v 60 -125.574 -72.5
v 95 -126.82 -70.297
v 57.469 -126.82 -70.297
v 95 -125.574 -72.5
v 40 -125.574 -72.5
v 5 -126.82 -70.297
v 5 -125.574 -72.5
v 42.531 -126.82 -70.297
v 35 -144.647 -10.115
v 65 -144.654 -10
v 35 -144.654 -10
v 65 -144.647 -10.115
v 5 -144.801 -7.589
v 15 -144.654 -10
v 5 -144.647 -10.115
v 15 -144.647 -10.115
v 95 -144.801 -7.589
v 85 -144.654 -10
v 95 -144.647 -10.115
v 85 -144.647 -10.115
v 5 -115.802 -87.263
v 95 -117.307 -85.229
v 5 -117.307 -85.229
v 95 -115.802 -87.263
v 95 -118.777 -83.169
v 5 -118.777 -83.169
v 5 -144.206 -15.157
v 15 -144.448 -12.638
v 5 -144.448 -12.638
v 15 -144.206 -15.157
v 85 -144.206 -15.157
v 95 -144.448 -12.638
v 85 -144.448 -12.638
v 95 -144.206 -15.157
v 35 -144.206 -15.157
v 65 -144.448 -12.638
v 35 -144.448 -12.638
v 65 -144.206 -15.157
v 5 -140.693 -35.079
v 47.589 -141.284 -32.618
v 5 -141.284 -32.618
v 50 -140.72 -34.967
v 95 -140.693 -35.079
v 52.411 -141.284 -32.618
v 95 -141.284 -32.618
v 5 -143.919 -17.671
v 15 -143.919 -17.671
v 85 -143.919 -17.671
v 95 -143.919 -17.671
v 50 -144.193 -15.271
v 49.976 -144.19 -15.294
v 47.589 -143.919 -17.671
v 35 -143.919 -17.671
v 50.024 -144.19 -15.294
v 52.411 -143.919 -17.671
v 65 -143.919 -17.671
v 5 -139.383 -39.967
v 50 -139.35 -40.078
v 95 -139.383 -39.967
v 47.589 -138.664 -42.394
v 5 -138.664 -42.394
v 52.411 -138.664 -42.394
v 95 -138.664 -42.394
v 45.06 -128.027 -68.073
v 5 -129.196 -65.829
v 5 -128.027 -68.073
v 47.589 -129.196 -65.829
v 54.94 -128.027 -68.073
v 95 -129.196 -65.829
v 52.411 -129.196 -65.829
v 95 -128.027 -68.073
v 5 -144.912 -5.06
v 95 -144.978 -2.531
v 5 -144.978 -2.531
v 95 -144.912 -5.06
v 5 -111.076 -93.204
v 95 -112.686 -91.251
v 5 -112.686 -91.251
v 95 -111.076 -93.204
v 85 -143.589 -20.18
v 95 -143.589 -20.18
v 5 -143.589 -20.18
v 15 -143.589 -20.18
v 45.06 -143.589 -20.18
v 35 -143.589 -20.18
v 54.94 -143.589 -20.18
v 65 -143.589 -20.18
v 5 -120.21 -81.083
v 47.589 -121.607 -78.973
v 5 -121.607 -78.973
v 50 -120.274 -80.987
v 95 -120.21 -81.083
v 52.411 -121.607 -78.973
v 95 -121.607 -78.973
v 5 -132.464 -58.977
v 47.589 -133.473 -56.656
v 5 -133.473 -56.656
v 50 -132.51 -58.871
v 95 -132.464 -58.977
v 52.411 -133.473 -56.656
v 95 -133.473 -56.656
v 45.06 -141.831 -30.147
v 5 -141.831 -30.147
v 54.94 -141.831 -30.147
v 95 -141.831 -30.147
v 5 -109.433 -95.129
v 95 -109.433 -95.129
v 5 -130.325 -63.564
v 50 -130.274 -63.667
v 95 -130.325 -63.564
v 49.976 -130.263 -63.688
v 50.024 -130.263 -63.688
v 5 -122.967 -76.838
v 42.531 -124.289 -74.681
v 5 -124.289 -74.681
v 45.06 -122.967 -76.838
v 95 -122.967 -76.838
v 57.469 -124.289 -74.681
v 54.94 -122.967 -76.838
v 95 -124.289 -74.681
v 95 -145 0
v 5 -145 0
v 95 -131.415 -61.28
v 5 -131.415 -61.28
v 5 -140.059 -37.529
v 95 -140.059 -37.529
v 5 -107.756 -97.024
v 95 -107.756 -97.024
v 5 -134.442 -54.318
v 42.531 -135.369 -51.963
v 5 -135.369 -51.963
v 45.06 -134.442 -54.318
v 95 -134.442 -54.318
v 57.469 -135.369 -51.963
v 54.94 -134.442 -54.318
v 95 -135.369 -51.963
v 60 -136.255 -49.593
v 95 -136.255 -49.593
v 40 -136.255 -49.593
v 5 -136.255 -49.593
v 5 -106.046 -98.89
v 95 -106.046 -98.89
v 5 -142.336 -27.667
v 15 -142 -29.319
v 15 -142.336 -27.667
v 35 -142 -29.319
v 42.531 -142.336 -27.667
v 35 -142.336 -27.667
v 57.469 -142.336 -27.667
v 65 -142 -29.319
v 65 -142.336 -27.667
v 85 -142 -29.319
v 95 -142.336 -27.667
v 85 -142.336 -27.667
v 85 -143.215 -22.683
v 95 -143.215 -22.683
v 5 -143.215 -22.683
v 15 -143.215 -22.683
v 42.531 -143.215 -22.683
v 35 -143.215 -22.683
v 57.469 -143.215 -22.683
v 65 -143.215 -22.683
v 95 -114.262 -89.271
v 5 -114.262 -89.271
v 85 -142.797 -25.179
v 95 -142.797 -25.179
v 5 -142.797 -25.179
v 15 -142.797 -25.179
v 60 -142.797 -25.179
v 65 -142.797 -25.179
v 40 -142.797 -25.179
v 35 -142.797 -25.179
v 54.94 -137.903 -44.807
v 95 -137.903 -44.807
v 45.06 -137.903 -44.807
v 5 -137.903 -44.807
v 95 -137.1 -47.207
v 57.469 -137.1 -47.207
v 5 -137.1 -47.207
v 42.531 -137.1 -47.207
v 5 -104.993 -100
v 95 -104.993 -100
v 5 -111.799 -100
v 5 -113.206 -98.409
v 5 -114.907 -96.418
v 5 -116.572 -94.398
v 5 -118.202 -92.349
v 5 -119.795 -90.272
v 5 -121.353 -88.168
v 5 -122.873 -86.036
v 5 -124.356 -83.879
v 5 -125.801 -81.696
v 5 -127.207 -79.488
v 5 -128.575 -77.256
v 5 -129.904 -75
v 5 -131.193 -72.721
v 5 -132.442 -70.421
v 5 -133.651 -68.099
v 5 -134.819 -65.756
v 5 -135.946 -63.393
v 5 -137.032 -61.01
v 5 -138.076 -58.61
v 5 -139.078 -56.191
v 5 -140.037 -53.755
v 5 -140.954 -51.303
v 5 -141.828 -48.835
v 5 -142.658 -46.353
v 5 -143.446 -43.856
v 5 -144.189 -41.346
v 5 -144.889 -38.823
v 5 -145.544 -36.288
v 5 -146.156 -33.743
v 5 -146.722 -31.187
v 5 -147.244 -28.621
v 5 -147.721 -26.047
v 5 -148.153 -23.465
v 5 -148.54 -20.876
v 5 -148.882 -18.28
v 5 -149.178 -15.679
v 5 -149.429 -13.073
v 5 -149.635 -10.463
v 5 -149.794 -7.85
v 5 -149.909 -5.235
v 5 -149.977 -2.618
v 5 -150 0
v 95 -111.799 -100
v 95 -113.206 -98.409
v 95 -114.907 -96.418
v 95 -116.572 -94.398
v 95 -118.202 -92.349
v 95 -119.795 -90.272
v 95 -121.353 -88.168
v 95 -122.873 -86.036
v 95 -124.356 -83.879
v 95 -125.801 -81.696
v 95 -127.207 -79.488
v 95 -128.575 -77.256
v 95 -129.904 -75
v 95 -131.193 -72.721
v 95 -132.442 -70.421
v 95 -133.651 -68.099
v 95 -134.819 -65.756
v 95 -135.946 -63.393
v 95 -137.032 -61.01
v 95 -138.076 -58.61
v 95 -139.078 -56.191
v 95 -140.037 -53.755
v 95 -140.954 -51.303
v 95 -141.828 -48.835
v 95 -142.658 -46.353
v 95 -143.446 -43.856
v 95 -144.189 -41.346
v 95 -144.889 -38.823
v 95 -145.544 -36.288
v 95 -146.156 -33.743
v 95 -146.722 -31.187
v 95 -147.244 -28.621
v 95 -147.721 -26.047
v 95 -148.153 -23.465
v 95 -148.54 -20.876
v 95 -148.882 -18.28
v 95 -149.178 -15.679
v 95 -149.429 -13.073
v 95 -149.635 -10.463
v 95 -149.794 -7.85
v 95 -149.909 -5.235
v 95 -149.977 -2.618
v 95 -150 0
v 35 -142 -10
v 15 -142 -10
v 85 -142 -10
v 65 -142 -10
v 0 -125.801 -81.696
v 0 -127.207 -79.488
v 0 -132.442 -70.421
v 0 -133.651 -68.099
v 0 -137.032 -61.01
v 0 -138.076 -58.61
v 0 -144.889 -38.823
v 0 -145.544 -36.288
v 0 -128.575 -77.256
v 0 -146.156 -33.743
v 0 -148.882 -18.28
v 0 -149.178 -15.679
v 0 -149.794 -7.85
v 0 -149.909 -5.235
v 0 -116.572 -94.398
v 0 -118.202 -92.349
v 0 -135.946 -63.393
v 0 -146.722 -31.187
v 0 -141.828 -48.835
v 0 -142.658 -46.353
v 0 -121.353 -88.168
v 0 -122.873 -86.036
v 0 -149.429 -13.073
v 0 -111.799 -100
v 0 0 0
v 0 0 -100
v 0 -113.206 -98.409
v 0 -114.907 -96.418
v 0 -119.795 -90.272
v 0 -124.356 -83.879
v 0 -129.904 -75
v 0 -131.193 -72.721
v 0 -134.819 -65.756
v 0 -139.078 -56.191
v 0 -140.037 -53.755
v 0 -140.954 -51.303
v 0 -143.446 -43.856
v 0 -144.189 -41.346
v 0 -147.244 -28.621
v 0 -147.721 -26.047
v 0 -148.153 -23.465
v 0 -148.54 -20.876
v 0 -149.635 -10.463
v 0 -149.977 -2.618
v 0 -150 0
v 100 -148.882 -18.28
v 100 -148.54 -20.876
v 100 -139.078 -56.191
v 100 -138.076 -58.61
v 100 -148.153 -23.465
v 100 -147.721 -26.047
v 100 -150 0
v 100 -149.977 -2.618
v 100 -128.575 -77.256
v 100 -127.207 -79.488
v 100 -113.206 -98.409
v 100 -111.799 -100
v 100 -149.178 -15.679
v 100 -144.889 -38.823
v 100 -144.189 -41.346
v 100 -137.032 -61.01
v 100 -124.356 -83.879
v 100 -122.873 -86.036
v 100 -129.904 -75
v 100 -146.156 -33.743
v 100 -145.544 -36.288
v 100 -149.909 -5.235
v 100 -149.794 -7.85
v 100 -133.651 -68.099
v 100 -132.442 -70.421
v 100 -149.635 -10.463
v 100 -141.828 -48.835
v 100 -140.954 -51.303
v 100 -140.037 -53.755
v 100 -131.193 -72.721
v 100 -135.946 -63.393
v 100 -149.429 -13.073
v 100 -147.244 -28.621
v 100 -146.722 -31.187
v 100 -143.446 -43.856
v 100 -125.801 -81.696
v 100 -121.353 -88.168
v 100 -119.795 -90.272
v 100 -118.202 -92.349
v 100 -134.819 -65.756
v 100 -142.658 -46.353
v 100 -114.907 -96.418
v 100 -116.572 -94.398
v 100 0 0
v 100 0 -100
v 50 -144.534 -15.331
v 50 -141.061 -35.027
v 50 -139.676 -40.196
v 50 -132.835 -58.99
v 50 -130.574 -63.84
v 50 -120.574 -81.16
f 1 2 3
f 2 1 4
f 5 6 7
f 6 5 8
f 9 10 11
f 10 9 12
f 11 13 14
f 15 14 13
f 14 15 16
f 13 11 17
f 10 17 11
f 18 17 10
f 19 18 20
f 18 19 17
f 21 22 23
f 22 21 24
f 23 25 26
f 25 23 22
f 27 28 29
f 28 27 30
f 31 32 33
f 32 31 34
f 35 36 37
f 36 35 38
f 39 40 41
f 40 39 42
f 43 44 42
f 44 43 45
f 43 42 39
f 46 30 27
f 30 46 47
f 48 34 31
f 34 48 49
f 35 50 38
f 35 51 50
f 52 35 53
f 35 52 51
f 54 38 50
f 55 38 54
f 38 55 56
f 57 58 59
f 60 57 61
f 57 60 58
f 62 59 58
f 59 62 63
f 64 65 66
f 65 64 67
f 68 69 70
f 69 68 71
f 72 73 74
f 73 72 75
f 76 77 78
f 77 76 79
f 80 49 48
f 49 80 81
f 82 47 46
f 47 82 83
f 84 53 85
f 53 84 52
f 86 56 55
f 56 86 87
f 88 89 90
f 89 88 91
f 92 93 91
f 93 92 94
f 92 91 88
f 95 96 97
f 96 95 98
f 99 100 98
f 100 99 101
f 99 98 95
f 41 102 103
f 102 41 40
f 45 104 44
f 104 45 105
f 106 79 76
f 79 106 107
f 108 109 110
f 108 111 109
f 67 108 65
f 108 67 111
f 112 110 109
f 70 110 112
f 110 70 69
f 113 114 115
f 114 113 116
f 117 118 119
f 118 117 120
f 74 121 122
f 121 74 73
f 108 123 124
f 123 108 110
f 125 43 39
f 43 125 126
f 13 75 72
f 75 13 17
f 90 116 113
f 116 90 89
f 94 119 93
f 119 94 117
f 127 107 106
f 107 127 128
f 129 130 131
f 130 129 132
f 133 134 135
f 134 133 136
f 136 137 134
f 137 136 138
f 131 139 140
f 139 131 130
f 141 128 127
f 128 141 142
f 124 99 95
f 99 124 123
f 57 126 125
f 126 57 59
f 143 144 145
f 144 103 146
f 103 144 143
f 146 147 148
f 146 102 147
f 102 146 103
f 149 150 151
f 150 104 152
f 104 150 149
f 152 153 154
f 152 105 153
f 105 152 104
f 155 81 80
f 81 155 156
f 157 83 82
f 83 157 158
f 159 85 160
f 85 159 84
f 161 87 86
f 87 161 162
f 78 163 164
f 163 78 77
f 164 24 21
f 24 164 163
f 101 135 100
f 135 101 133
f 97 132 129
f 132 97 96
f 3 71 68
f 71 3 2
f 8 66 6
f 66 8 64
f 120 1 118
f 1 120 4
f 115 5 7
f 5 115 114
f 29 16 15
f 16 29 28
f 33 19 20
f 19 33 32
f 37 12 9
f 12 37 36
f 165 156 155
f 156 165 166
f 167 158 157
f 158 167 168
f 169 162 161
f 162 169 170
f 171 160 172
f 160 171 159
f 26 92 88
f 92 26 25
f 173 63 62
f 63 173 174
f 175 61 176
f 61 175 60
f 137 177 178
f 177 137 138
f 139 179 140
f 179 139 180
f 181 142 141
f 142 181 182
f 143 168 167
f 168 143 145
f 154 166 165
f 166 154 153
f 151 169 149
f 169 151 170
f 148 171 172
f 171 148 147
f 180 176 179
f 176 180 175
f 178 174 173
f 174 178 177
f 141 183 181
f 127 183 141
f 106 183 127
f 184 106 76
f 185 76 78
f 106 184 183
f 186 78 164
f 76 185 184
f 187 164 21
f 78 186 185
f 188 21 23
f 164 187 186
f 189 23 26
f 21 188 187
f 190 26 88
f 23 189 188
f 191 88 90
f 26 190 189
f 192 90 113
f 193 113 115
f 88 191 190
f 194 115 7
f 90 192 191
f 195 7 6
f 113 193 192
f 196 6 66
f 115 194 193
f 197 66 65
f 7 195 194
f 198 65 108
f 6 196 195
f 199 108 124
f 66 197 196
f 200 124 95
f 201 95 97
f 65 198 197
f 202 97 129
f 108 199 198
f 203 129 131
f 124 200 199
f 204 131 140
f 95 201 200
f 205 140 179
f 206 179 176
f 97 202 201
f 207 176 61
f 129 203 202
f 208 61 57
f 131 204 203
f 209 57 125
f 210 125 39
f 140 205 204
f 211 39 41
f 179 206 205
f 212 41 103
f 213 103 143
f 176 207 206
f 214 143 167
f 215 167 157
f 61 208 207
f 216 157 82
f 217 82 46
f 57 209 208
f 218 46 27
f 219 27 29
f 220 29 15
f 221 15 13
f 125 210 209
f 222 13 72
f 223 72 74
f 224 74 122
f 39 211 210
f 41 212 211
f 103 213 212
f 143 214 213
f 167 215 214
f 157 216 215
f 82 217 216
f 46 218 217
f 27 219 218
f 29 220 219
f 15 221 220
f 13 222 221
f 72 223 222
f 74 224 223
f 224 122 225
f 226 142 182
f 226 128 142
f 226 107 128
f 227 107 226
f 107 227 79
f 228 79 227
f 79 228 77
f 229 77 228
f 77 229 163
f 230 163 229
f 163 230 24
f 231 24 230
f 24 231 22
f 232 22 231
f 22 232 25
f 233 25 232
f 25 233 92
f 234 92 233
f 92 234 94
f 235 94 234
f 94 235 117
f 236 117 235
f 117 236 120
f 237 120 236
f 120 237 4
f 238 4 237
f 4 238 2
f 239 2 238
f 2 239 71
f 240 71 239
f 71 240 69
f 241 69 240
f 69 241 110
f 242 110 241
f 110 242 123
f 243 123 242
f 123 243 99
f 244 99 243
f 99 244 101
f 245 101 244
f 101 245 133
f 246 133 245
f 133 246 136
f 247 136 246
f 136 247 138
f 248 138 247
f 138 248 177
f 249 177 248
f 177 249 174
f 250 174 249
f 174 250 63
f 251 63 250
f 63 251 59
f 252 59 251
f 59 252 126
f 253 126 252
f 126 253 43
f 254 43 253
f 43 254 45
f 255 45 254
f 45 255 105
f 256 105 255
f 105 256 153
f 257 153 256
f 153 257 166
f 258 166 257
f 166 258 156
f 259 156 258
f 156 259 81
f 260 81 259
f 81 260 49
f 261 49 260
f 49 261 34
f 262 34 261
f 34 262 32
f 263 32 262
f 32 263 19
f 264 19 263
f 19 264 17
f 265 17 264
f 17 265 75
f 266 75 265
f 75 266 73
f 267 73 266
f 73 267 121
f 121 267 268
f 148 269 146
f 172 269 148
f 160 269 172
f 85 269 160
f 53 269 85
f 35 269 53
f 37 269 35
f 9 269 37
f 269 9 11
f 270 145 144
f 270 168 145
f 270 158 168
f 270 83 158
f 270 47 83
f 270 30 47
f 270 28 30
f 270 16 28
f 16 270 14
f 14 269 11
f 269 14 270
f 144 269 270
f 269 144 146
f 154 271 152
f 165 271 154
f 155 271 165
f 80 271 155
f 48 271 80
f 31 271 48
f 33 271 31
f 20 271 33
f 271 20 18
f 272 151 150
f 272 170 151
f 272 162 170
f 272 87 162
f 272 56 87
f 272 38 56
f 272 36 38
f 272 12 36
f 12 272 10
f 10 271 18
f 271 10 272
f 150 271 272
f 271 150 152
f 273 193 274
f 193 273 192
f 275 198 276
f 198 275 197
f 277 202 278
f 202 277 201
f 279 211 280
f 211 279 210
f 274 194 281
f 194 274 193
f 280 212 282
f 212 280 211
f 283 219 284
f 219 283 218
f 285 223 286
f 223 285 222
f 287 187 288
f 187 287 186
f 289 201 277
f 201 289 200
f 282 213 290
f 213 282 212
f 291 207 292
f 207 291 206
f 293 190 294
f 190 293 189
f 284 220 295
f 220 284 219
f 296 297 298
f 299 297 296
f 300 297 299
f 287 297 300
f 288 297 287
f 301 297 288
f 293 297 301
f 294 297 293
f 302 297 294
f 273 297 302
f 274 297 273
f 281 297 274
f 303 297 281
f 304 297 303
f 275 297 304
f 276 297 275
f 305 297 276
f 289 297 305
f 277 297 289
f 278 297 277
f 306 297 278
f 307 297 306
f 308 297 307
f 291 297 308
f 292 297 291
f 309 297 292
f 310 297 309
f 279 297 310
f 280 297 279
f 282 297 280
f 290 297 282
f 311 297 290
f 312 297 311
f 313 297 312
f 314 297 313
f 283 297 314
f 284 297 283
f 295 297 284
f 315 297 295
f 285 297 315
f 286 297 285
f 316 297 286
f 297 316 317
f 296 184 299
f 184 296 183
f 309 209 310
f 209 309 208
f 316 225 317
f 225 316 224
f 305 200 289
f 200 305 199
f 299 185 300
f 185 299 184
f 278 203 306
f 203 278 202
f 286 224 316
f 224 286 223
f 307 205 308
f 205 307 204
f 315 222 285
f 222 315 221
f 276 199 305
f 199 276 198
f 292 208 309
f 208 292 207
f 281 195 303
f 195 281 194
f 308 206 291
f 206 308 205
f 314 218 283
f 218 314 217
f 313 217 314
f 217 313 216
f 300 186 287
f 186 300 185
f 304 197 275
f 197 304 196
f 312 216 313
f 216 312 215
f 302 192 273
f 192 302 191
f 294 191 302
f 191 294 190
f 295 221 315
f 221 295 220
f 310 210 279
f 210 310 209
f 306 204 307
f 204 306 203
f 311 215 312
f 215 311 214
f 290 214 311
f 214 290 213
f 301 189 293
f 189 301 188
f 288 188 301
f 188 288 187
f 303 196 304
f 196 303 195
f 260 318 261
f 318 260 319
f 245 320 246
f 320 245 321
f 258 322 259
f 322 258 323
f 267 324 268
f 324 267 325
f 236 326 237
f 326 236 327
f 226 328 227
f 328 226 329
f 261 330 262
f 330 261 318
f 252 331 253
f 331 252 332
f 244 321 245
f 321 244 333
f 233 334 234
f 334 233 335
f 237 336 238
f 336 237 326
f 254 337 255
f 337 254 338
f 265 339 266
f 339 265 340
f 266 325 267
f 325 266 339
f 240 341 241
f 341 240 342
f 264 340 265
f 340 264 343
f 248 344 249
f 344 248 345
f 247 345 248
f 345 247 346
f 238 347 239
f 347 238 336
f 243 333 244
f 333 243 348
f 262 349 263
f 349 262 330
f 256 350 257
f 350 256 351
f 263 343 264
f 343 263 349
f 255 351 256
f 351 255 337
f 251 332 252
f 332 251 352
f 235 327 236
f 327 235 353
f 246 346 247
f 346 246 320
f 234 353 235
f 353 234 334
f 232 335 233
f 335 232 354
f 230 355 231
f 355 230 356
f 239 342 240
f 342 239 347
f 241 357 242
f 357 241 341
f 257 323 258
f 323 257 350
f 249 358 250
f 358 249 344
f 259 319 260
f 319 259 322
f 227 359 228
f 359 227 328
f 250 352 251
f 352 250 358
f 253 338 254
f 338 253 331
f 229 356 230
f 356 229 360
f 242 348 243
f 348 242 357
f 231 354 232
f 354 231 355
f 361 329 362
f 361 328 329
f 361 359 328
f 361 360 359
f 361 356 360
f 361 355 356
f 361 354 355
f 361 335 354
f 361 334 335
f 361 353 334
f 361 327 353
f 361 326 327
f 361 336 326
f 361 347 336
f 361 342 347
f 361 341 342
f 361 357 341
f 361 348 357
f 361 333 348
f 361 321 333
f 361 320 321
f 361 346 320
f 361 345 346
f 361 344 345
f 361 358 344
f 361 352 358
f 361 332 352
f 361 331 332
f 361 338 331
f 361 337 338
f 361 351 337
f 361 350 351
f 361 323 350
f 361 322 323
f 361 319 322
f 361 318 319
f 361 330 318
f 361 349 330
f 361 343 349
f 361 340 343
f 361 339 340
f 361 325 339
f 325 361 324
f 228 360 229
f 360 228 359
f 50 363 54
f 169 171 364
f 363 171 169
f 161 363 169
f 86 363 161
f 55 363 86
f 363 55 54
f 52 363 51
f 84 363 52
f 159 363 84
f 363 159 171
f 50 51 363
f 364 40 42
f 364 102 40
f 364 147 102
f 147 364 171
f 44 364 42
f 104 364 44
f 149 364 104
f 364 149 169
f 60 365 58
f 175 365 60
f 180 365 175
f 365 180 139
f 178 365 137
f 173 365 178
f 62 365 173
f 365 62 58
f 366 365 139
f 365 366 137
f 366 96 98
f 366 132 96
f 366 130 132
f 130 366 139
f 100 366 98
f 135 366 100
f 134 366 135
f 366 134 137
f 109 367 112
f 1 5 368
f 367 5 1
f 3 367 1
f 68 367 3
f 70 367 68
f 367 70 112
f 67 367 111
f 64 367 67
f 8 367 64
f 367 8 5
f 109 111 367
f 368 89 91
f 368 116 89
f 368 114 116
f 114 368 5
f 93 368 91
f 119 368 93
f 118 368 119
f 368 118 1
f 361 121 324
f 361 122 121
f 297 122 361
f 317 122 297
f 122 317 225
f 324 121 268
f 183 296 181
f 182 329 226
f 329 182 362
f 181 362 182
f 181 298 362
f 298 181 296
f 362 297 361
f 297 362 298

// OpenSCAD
$fa = 1;
$fs = 0.4;

intersection() {
	union() {
		rotate([0, 90, 0]) {
			cylinder(r=150, h=5);
			translate([0, 0, 5]) {
				difference() {
					cylinder(r=145, h=90);
					translate([10, -162, 10]) {
						cube(20);
					}
					translate([10, -162, 60]) {
						cube(20);
					}
				}
			}
			translate([0, 0, 95]) {
				cylinder(r=150, h=5);
			}
		}
		translate([50, 0, 0]) {
			rotate([100, 0, 0]) {
				cylinder(r=10, h=145, $fn=4);
			}
			rotate([110, 0, 0]) {
				cylinder(r=10, h=145, $fn=4);
			}
			rotate([120, 0, 0]) {
				cylinder(r=10, h=145, $fn=4);
			}
		}
	}
	translate([0, -150, -100]) {
		cube([150, 150, 100]);
	}
}
